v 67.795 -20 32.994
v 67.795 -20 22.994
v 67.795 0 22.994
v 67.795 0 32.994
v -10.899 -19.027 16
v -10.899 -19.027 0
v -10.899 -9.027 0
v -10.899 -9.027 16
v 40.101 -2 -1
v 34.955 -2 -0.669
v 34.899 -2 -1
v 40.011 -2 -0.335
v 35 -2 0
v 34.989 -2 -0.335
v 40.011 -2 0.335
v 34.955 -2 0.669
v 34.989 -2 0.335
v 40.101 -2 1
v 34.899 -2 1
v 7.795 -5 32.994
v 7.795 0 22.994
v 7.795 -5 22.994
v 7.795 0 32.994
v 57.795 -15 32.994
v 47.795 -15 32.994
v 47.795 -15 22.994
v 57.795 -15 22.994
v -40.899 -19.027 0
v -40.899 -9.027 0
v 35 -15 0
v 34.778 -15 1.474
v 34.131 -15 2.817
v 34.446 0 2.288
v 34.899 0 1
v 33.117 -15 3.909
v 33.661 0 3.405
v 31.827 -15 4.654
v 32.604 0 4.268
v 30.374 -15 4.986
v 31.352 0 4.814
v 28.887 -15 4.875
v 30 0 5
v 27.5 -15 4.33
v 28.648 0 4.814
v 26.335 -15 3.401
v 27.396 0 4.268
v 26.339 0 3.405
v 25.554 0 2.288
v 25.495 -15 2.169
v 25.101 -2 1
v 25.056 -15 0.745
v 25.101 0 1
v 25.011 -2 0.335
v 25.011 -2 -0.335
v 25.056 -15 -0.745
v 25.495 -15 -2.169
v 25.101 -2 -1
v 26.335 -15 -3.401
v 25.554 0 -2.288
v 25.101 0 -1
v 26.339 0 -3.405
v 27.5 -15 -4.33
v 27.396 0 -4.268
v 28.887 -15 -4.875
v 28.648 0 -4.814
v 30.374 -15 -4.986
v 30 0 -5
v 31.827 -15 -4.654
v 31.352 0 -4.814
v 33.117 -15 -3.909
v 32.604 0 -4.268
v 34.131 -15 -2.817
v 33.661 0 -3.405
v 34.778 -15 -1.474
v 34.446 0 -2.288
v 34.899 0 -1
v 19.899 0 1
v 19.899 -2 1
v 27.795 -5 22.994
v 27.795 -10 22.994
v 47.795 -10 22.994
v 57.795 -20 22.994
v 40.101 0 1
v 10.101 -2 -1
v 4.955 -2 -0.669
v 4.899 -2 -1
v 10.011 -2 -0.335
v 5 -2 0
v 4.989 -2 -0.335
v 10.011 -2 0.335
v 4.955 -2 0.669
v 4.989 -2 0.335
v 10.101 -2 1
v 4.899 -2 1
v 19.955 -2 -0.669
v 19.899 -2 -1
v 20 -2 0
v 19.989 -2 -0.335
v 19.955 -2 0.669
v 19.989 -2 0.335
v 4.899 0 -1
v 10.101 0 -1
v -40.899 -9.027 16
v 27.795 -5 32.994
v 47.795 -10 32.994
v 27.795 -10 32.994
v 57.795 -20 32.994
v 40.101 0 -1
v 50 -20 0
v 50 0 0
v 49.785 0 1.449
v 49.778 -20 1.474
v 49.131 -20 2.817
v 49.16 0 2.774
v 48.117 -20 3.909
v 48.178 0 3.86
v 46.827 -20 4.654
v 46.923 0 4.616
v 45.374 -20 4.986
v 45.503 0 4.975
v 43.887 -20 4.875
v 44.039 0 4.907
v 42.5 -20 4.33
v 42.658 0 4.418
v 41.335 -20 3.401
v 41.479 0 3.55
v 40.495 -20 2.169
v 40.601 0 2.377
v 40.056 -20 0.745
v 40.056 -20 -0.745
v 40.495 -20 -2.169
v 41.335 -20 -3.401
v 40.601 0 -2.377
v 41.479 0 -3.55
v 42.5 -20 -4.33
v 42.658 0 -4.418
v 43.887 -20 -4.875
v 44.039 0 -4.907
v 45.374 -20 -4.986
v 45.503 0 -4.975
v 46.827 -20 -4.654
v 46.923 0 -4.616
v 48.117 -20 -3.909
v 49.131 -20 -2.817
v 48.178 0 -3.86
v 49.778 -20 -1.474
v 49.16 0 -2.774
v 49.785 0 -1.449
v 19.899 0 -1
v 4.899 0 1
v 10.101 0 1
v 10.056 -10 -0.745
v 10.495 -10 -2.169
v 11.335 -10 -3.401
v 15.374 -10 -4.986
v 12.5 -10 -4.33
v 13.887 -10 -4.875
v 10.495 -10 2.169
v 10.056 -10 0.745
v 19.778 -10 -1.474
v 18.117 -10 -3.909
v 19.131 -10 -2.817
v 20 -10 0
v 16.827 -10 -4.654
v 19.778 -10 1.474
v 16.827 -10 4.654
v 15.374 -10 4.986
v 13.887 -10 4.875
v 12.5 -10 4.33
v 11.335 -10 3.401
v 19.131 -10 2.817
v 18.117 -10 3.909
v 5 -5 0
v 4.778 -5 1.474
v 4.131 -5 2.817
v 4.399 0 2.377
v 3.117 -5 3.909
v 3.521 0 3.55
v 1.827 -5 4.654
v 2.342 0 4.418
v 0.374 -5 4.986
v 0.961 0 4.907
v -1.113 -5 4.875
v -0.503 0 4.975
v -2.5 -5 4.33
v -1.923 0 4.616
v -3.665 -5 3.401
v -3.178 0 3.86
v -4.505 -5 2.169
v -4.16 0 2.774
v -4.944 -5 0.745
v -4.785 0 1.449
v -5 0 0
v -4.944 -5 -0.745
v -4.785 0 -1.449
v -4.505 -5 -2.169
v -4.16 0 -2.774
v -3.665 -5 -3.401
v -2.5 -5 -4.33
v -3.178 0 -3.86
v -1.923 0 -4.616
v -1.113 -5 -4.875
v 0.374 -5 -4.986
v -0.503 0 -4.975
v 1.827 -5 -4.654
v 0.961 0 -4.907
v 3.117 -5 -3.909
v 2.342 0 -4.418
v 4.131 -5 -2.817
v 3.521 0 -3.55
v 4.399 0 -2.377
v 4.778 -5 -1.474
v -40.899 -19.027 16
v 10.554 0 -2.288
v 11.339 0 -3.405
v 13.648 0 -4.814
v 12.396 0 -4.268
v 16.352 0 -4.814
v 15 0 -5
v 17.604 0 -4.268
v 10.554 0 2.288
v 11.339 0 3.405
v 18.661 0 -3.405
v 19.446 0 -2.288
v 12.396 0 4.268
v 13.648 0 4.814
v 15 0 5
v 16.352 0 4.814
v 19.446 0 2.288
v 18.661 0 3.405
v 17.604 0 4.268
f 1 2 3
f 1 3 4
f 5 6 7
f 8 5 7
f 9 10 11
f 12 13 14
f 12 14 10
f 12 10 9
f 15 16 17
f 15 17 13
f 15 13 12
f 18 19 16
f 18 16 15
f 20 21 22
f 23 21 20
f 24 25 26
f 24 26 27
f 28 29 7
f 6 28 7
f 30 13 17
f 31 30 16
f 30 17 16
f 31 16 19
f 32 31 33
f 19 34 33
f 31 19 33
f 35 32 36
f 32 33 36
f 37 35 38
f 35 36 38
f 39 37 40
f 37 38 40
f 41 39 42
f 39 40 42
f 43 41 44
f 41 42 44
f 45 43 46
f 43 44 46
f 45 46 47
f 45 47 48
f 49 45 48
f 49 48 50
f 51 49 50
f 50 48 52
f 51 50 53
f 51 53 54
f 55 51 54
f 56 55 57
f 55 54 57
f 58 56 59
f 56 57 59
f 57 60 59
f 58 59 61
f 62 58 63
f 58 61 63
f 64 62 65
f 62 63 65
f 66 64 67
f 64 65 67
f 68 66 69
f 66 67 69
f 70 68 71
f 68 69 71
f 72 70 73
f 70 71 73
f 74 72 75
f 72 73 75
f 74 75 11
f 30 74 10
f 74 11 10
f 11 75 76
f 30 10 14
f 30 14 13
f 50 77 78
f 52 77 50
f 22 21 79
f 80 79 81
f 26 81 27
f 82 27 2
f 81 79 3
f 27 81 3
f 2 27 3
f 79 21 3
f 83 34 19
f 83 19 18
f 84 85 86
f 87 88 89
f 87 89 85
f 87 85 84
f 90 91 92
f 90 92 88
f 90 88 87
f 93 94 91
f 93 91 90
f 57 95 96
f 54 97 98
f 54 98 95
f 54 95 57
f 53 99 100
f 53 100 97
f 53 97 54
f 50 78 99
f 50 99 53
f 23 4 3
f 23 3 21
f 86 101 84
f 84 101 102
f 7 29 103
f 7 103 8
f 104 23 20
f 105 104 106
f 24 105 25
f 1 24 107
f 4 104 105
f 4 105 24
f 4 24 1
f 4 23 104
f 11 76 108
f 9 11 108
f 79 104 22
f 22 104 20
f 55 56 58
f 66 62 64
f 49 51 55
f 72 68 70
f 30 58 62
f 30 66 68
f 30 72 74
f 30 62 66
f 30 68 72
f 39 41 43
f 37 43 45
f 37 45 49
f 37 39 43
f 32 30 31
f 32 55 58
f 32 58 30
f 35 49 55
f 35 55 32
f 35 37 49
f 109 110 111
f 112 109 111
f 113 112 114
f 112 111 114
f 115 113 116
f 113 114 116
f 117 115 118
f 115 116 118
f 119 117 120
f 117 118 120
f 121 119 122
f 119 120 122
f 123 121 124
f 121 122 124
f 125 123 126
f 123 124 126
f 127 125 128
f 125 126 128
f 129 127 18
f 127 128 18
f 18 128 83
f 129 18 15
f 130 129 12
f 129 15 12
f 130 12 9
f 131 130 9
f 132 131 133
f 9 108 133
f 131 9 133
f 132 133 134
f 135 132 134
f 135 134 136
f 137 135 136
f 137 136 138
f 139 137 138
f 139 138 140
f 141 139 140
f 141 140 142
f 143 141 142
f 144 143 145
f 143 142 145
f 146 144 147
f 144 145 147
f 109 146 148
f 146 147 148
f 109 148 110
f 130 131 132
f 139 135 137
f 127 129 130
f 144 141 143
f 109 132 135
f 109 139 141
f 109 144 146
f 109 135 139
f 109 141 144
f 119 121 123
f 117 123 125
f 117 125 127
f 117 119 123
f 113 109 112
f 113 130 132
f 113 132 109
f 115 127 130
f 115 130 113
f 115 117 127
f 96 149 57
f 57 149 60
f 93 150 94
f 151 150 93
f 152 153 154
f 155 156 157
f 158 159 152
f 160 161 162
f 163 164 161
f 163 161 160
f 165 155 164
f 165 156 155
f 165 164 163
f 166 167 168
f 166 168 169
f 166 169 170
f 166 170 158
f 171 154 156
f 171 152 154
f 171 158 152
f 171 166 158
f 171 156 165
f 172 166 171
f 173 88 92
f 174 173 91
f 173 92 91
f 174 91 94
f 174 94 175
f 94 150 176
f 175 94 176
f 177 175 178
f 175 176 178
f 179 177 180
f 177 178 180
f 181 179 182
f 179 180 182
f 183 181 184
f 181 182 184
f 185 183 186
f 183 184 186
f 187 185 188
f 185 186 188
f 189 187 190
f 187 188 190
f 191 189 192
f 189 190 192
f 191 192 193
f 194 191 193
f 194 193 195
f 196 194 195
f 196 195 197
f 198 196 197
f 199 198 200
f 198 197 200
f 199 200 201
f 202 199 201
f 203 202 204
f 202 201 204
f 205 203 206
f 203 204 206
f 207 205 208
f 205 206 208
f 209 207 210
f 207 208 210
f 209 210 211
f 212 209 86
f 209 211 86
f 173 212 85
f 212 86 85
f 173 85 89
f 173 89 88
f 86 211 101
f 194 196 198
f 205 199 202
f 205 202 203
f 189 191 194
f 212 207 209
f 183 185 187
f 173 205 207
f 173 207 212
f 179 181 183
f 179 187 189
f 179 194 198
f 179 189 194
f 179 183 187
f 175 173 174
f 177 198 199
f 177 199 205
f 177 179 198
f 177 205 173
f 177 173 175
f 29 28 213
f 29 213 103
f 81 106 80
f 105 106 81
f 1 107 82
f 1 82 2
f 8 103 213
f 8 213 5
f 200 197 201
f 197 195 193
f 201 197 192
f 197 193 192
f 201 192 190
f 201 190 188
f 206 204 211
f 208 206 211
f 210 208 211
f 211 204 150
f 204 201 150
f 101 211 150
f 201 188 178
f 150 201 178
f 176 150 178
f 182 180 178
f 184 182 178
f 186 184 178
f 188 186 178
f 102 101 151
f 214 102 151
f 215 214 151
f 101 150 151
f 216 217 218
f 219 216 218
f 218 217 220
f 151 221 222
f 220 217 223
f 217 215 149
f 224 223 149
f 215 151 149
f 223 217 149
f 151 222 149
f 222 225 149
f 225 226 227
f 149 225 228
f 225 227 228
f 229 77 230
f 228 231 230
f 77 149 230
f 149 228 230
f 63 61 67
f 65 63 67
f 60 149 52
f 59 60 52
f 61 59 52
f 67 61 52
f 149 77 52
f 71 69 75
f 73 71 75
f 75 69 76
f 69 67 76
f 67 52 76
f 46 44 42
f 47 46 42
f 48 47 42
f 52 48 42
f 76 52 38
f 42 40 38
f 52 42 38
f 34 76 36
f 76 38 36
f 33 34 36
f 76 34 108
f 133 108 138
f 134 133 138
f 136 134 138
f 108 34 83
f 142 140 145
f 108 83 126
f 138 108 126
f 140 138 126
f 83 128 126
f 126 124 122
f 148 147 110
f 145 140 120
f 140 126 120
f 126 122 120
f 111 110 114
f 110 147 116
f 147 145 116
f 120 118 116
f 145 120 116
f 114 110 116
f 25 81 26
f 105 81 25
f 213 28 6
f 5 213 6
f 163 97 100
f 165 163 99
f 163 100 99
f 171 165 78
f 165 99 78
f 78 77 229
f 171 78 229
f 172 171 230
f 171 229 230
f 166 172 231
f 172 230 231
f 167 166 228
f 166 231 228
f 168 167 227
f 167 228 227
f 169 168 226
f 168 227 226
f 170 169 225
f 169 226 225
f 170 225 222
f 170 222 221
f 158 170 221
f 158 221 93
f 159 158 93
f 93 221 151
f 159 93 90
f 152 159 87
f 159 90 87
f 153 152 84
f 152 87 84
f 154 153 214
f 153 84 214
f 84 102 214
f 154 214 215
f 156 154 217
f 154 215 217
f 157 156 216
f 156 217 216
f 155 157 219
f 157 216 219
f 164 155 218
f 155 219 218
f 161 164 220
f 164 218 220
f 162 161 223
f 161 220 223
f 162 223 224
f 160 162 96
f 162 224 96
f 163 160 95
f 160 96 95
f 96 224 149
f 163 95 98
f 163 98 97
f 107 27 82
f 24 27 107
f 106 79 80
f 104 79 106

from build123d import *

# Parameters (mm, degrees)
F0_R      = 5
F1_DEPTH  = 5
F2_DEPTH  = 10
F3_DEPTH  = 15
F4_DEPTH  = 20
F7_W      = 60
F7_H      = 10
F8_DEPTH  = 5
F9_W      = 40
F9_H      = 10
F10_DEPTH = 5
F11_W     = 20
F11_H     = 10
F12_DEPTH = 5
F13_W     = 10
F13_H     = 10
F14_DEPTH = 5
F15_W     = 44.9199787766
F15_H     = 2
F16_DEPTH = 2
F17_W     = 30
F17_H     = 10
F18_DEPTH = 16


# Not quite as in the source:
# - a feature names something its author has since deleted; it is built from what else it names


with BuildPart() as f1:
    # F0 (on Front) → F1 (new body)
    with BuildSketch(Plane.XZ):
        Circle(F0_R)
    extrude(amount=F1_DEPTH)


with BuildPart() as f2:
    # F0 (on Front) → F2 (new body)
    with BuildSketch(Plane.XZ):
        with Locations((15, 0)):
            Circle(F0_R)
    extrude(amount=F2_DEPTH)


with BuildPart() as f3:
    # F0 (on Front) → F3 (new body)
    with BuildSketch(Plane.XZ):
        with Locations((30, 0)):
            Circle(F0_R)
    extrude(amount=F3_DEPTH)


with BuildPart() as f4:
    # F0 (on Front) → F4 (new body)
    with BuildSketch(Plane.XZ):
        with Locations((45, 0)):
            Circle(F0_R)
    extrude(amount=F4_DEPTH)

    # F6: union F3, F2, F1
    add(f3.part)
    add(f2.part)
    add(f1.part)

    # F15 (on face) → F16 (join)
    with BuildSketch(Plane.XZ):
        with Locations((22.7489862844, 0)):
            Rectangle(F15_W, F15_H)
    extrude(amount=F16_DEPTH)


with BuildPart() as f8:
    # F7 (on face) → F8 (new body)
    with BuildSketch(Plane(origin=(0, 0, 0), x_dir=(-1, 0, 0), z_dir=(0, 1, 0))):
        with Locations((-37.7946806746, 27.9940228151)):
            Rectangle(F7_W, F7_H)
    extrude(amount=-F8_DEPTH)

    # F9 (on face) → F10 (join)
    with BuildSketch(Plane.XZ.offset(5)):
        with Locations((47.7946806746, 27.9940228151)):
            Rectangle(F9_W, F9_H)
    extrude(amount=F10_DEPTH)

    # F11 (on face) → F12 (join)
    with BuildSketch(Plane.XZ.offset(10)):
        with Locations((57.7946806746, 27.9940228151)):
            Rectangle(F11_W, F11_H)
    extrude(amount=F12_DEPTH)

    # F13 (on face) → F14 (join)
    with BuildSketch(Plane.XZ.offset(15)):
        with Locations((62.7946806746, 27.9940228151)):
            Rectangle(F13_W, F13_H)
    extrude(amount=F14_DEPTH)


with BuildPart() as f18:
    # F17 (on Top) → F18 (new body)
    with BuildSketch(Plane.XY):
        with Locations((-25.8990339628, -14.026532881)):
            Rectangle(F17_W, F17_H)
    extrude(amount=F18_DEPTH)


solid = Compound([f4.part, f8.part, f18.part])
